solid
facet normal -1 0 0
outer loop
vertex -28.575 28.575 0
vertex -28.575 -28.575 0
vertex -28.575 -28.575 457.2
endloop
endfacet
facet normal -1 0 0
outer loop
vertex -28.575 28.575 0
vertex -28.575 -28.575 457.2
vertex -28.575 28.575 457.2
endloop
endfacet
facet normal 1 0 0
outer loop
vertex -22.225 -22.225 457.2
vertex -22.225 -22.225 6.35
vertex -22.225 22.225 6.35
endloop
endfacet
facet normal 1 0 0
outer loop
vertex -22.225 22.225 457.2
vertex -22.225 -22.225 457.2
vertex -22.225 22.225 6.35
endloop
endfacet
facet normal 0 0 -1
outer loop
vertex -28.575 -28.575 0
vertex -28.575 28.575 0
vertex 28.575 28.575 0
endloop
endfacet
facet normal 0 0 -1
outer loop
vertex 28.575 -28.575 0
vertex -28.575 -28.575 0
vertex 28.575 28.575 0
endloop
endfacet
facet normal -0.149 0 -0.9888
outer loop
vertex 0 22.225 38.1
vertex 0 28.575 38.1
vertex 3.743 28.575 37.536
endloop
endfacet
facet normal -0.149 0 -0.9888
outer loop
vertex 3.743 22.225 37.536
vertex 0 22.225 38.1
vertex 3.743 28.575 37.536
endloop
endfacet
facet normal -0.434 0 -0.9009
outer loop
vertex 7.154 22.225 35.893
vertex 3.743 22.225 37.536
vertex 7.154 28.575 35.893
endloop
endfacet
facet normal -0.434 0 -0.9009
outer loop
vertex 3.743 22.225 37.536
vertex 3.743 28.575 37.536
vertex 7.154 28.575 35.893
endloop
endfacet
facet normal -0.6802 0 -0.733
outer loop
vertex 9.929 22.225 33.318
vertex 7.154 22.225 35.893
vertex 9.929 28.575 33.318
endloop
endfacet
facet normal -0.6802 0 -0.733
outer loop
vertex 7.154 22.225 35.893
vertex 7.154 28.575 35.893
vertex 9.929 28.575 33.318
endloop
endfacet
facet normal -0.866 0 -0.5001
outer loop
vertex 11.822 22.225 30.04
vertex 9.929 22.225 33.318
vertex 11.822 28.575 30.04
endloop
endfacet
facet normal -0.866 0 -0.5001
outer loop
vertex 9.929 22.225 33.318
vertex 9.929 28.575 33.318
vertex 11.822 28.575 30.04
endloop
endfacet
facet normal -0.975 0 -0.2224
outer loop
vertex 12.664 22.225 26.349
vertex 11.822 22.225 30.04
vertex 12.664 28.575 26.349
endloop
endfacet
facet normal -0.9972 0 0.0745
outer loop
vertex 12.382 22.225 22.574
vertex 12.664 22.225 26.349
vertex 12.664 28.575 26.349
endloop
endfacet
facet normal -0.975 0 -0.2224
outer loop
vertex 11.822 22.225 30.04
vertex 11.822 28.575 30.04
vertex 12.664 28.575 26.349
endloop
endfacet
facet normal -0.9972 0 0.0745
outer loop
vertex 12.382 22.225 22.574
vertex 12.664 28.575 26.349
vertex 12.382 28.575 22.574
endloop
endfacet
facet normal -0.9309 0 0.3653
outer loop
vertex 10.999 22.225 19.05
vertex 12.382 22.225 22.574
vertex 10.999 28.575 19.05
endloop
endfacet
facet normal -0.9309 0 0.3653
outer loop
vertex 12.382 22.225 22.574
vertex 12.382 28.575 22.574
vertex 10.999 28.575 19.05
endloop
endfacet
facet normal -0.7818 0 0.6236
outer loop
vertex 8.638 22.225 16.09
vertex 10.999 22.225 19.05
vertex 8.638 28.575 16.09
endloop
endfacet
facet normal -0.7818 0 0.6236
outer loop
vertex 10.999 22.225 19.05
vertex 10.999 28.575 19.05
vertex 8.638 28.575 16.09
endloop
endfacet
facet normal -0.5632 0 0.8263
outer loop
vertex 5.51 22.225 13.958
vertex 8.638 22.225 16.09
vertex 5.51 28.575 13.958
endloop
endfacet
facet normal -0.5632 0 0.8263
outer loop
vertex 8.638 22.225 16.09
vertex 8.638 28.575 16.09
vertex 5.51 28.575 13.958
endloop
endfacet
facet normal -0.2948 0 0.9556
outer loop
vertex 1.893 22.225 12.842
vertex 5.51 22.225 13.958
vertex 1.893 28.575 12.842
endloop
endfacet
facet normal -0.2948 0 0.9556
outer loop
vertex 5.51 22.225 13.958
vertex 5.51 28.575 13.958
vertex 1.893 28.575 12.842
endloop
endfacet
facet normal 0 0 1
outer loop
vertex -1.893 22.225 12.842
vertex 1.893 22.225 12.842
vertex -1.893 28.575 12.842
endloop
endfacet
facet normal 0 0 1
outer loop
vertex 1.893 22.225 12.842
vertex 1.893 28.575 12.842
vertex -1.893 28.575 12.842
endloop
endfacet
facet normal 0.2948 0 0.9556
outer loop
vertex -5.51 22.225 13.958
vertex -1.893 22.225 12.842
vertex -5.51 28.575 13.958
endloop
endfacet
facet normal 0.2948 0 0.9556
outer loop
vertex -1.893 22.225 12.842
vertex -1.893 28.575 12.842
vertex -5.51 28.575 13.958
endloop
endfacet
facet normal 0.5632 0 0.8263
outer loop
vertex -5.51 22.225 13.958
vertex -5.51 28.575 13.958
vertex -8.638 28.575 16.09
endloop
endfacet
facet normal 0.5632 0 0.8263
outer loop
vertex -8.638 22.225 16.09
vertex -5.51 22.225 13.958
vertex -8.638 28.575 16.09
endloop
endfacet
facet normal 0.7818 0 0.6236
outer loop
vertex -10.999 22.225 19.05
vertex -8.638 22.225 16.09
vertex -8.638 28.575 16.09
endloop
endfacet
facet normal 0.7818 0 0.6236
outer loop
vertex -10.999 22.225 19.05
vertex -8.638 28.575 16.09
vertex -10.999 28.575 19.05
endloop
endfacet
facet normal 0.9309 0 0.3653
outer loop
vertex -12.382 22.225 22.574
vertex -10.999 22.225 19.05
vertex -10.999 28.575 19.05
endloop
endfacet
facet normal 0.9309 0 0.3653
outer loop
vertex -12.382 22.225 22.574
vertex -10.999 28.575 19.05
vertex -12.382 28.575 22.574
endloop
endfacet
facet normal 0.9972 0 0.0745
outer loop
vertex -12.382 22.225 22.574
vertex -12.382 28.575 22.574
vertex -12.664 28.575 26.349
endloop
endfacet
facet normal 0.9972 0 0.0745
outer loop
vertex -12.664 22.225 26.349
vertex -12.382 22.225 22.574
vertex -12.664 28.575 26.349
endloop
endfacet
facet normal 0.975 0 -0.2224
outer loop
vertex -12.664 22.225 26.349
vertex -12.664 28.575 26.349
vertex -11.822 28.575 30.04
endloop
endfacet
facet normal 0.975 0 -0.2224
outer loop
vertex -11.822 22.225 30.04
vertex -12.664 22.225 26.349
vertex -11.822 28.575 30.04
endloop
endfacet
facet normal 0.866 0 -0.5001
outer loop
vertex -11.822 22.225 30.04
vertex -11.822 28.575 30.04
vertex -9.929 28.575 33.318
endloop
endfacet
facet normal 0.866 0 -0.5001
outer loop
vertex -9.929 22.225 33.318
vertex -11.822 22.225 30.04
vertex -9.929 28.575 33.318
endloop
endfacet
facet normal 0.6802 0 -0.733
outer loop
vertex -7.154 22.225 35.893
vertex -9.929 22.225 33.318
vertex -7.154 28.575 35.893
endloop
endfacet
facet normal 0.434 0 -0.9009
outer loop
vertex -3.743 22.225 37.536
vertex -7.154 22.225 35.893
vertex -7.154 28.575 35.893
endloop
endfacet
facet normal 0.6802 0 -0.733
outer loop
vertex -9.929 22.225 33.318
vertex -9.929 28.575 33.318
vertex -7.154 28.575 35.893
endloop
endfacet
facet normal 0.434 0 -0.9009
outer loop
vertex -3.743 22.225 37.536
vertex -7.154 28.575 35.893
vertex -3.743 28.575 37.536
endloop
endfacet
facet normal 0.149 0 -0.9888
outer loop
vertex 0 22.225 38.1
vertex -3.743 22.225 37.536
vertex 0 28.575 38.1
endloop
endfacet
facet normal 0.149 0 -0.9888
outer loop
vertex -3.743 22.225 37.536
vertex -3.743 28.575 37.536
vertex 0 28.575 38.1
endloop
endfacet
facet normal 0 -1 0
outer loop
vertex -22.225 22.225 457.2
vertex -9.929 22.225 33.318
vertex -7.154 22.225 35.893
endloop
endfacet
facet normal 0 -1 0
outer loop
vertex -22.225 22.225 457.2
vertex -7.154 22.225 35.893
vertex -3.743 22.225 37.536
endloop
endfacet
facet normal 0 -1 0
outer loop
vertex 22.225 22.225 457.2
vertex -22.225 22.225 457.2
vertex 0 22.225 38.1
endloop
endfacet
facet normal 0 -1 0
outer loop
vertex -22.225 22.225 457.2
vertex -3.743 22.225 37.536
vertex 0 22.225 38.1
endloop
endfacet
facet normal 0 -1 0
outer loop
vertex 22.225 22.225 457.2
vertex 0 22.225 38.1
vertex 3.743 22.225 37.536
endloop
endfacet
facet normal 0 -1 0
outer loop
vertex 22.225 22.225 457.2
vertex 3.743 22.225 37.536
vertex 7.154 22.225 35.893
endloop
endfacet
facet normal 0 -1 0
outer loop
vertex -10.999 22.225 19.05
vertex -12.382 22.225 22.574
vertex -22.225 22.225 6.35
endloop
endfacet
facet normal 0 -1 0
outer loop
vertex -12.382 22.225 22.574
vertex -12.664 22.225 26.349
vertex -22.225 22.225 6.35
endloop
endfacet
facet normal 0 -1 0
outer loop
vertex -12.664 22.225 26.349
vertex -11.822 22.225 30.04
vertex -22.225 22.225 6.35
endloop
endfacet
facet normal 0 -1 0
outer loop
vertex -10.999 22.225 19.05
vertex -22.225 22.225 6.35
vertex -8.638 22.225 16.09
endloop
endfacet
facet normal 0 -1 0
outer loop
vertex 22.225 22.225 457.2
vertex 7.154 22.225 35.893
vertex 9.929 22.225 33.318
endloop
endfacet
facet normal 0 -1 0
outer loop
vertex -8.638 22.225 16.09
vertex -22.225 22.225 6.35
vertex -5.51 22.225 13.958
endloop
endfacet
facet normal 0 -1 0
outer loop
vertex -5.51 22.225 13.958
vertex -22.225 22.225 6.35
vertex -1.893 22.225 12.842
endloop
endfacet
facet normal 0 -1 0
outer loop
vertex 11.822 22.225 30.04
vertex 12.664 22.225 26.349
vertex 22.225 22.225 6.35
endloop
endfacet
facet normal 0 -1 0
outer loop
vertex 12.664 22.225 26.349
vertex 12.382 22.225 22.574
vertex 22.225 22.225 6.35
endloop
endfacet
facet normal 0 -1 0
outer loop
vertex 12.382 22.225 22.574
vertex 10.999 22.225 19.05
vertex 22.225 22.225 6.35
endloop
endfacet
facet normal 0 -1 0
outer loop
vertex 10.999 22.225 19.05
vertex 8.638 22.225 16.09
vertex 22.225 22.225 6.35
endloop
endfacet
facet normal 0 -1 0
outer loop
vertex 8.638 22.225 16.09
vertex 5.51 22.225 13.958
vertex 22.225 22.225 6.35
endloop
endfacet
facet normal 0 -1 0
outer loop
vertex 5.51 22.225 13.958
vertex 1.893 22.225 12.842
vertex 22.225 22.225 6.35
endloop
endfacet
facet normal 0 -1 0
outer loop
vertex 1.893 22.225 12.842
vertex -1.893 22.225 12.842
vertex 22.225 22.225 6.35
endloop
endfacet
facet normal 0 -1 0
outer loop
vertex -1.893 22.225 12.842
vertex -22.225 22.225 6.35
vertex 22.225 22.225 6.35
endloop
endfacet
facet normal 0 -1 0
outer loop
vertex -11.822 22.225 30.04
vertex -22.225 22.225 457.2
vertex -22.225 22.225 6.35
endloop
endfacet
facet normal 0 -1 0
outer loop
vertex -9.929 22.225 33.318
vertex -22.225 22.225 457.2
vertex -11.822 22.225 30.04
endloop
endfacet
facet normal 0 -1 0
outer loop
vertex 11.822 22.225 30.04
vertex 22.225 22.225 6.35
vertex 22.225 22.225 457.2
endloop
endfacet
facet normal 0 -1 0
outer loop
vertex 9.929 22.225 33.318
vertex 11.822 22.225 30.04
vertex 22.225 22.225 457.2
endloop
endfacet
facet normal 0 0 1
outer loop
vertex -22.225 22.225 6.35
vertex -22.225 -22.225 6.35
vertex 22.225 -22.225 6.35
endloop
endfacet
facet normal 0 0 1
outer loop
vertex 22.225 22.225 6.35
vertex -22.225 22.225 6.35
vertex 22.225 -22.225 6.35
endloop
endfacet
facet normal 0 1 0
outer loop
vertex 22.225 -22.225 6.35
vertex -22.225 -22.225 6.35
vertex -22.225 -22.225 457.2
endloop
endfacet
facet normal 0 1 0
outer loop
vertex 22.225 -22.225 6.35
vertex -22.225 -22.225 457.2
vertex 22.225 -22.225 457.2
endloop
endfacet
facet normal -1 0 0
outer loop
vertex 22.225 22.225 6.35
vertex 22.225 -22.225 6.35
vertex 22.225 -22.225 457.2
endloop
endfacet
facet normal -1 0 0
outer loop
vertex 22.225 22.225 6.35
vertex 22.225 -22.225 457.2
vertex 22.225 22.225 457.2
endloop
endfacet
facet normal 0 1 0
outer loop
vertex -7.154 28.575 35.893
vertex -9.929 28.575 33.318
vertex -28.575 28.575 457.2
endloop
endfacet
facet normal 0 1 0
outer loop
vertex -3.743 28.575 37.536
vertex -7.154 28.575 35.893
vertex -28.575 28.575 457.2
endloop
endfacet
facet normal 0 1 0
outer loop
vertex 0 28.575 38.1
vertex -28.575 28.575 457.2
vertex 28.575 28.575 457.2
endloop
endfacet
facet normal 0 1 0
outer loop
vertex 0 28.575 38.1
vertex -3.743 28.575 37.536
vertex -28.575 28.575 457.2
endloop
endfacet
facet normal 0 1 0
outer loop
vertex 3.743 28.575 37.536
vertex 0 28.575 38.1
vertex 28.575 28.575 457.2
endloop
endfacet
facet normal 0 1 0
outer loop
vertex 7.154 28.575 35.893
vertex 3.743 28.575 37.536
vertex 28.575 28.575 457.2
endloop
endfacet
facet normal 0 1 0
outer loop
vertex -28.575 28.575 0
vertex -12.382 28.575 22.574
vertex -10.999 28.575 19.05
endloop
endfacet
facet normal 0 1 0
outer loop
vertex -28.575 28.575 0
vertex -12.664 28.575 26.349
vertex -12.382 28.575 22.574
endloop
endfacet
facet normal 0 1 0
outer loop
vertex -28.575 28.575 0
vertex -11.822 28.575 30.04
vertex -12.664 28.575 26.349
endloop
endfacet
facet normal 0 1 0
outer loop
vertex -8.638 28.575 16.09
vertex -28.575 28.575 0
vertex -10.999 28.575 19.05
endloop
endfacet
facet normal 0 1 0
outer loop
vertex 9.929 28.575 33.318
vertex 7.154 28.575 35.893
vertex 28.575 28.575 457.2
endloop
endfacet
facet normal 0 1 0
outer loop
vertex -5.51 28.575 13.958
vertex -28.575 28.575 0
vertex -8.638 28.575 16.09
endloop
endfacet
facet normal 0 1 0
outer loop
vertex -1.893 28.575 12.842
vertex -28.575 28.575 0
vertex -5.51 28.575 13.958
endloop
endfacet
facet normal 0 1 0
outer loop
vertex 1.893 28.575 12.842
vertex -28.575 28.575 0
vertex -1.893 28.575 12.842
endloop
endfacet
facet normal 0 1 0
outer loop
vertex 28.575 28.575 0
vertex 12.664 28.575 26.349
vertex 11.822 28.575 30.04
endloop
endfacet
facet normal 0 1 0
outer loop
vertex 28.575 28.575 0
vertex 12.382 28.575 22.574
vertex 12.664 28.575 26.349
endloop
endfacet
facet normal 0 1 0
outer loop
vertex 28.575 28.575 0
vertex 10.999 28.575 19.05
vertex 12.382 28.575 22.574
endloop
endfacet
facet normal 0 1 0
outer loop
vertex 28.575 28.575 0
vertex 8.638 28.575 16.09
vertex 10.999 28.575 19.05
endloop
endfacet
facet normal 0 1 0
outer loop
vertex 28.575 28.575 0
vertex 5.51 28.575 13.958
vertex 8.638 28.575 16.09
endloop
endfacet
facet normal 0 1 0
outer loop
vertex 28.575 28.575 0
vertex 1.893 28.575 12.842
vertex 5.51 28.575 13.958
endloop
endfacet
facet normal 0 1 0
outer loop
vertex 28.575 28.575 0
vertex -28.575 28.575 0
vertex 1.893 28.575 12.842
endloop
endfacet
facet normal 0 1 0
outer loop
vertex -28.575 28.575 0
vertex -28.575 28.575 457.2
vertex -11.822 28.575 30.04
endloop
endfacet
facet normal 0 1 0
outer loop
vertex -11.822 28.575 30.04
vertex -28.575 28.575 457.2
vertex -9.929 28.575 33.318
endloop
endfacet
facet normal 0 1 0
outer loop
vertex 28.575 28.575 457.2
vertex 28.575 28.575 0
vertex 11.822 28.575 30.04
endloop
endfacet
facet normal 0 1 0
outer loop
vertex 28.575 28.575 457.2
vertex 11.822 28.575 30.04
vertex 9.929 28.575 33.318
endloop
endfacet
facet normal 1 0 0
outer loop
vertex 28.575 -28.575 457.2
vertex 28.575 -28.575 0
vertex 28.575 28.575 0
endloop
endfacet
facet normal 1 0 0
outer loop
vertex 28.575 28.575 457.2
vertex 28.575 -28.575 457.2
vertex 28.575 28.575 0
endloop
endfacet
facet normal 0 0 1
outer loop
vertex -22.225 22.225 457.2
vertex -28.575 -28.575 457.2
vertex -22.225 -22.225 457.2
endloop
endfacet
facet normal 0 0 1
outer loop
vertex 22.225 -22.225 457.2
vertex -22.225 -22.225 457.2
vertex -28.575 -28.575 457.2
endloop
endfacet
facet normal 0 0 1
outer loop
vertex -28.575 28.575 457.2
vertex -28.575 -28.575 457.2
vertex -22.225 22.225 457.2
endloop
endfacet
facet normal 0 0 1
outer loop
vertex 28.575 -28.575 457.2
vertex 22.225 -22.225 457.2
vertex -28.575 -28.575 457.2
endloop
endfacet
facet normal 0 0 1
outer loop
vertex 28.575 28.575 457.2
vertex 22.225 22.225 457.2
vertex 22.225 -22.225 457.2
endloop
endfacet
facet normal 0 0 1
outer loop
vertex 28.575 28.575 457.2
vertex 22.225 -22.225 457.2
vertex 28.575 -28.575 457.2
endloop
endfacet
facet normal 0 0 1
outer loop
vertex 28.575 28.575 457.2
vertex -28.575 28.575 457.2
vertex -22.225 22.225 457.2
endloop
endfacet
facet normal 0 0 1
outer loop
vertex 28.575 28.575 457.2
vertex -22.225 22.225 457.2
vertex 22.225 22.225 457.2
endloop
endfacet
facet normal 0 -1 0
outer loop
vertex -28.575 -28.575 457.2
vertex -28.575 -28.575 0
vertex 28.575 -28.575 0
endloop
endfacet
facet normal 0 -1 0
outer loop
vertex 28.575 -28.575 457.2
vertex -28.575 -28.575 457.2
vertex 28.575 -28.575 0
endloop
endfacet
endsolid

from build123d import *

# Parameters (mm, degrees)
SKETCH1_W           = 57.15
SKETCH1_H           = 57.15
SKETCH1_W_2         = 44.45
SKETCH1_H_2         = 44.45
BOSS_EXTRUDE1_DEPTH = 457.2
SKETCH2_W           = 44.45
SKETCH2_H           = 6.35
BOSS_EXTRUDE2_DEPTH = 44.45
SKETCH3_R           = 12.7
CUT_EXTRUDE1_DEPTH  = 6.35


with BuildPart() as part:
    # Sketch1 → Boss-Extrude1 (new body)
    with BuildSketch(Plane.XY):
        Rectangle(SKETCH1_W, SKETCH1_H)
        Rectangle(SKETCH1_W_2, SKETCH1_H_2, mode=Mode.SUBTRACT)
    extrude(amount=BOSS_EXTRUDE1_DEPTH)

    # Sketch2 → Boss-Extrude2 (add)
    with BuildSketch(Plane(origin=(0, -22.225, 0), x_dir=(1, 0, 0), z_dir=(0, 1, 0))):
        with Locations((0, -3.175)):
            Rectangle(SKETCH2_W, SKETCH2_H)
    extrude(amount=BOSS_EXTRUDE2_DEPTH)

    # Sketch3 → Cut-Extrude1 (cut)
    with BuildSketch(Plane(origin=(0, 28.575, 0), x_dir=(0, 0, -1), z_dir=(0, 1, 0))):
        with Locations(Location((-25.4, 0, 0), (0, 0, 180))):
            Circle(SKETCH3_R)
    extrude(amount=-CUT_EXTRUDE1_DEPTH, mode=Mode.SUBTRACT)


solid = part.part
